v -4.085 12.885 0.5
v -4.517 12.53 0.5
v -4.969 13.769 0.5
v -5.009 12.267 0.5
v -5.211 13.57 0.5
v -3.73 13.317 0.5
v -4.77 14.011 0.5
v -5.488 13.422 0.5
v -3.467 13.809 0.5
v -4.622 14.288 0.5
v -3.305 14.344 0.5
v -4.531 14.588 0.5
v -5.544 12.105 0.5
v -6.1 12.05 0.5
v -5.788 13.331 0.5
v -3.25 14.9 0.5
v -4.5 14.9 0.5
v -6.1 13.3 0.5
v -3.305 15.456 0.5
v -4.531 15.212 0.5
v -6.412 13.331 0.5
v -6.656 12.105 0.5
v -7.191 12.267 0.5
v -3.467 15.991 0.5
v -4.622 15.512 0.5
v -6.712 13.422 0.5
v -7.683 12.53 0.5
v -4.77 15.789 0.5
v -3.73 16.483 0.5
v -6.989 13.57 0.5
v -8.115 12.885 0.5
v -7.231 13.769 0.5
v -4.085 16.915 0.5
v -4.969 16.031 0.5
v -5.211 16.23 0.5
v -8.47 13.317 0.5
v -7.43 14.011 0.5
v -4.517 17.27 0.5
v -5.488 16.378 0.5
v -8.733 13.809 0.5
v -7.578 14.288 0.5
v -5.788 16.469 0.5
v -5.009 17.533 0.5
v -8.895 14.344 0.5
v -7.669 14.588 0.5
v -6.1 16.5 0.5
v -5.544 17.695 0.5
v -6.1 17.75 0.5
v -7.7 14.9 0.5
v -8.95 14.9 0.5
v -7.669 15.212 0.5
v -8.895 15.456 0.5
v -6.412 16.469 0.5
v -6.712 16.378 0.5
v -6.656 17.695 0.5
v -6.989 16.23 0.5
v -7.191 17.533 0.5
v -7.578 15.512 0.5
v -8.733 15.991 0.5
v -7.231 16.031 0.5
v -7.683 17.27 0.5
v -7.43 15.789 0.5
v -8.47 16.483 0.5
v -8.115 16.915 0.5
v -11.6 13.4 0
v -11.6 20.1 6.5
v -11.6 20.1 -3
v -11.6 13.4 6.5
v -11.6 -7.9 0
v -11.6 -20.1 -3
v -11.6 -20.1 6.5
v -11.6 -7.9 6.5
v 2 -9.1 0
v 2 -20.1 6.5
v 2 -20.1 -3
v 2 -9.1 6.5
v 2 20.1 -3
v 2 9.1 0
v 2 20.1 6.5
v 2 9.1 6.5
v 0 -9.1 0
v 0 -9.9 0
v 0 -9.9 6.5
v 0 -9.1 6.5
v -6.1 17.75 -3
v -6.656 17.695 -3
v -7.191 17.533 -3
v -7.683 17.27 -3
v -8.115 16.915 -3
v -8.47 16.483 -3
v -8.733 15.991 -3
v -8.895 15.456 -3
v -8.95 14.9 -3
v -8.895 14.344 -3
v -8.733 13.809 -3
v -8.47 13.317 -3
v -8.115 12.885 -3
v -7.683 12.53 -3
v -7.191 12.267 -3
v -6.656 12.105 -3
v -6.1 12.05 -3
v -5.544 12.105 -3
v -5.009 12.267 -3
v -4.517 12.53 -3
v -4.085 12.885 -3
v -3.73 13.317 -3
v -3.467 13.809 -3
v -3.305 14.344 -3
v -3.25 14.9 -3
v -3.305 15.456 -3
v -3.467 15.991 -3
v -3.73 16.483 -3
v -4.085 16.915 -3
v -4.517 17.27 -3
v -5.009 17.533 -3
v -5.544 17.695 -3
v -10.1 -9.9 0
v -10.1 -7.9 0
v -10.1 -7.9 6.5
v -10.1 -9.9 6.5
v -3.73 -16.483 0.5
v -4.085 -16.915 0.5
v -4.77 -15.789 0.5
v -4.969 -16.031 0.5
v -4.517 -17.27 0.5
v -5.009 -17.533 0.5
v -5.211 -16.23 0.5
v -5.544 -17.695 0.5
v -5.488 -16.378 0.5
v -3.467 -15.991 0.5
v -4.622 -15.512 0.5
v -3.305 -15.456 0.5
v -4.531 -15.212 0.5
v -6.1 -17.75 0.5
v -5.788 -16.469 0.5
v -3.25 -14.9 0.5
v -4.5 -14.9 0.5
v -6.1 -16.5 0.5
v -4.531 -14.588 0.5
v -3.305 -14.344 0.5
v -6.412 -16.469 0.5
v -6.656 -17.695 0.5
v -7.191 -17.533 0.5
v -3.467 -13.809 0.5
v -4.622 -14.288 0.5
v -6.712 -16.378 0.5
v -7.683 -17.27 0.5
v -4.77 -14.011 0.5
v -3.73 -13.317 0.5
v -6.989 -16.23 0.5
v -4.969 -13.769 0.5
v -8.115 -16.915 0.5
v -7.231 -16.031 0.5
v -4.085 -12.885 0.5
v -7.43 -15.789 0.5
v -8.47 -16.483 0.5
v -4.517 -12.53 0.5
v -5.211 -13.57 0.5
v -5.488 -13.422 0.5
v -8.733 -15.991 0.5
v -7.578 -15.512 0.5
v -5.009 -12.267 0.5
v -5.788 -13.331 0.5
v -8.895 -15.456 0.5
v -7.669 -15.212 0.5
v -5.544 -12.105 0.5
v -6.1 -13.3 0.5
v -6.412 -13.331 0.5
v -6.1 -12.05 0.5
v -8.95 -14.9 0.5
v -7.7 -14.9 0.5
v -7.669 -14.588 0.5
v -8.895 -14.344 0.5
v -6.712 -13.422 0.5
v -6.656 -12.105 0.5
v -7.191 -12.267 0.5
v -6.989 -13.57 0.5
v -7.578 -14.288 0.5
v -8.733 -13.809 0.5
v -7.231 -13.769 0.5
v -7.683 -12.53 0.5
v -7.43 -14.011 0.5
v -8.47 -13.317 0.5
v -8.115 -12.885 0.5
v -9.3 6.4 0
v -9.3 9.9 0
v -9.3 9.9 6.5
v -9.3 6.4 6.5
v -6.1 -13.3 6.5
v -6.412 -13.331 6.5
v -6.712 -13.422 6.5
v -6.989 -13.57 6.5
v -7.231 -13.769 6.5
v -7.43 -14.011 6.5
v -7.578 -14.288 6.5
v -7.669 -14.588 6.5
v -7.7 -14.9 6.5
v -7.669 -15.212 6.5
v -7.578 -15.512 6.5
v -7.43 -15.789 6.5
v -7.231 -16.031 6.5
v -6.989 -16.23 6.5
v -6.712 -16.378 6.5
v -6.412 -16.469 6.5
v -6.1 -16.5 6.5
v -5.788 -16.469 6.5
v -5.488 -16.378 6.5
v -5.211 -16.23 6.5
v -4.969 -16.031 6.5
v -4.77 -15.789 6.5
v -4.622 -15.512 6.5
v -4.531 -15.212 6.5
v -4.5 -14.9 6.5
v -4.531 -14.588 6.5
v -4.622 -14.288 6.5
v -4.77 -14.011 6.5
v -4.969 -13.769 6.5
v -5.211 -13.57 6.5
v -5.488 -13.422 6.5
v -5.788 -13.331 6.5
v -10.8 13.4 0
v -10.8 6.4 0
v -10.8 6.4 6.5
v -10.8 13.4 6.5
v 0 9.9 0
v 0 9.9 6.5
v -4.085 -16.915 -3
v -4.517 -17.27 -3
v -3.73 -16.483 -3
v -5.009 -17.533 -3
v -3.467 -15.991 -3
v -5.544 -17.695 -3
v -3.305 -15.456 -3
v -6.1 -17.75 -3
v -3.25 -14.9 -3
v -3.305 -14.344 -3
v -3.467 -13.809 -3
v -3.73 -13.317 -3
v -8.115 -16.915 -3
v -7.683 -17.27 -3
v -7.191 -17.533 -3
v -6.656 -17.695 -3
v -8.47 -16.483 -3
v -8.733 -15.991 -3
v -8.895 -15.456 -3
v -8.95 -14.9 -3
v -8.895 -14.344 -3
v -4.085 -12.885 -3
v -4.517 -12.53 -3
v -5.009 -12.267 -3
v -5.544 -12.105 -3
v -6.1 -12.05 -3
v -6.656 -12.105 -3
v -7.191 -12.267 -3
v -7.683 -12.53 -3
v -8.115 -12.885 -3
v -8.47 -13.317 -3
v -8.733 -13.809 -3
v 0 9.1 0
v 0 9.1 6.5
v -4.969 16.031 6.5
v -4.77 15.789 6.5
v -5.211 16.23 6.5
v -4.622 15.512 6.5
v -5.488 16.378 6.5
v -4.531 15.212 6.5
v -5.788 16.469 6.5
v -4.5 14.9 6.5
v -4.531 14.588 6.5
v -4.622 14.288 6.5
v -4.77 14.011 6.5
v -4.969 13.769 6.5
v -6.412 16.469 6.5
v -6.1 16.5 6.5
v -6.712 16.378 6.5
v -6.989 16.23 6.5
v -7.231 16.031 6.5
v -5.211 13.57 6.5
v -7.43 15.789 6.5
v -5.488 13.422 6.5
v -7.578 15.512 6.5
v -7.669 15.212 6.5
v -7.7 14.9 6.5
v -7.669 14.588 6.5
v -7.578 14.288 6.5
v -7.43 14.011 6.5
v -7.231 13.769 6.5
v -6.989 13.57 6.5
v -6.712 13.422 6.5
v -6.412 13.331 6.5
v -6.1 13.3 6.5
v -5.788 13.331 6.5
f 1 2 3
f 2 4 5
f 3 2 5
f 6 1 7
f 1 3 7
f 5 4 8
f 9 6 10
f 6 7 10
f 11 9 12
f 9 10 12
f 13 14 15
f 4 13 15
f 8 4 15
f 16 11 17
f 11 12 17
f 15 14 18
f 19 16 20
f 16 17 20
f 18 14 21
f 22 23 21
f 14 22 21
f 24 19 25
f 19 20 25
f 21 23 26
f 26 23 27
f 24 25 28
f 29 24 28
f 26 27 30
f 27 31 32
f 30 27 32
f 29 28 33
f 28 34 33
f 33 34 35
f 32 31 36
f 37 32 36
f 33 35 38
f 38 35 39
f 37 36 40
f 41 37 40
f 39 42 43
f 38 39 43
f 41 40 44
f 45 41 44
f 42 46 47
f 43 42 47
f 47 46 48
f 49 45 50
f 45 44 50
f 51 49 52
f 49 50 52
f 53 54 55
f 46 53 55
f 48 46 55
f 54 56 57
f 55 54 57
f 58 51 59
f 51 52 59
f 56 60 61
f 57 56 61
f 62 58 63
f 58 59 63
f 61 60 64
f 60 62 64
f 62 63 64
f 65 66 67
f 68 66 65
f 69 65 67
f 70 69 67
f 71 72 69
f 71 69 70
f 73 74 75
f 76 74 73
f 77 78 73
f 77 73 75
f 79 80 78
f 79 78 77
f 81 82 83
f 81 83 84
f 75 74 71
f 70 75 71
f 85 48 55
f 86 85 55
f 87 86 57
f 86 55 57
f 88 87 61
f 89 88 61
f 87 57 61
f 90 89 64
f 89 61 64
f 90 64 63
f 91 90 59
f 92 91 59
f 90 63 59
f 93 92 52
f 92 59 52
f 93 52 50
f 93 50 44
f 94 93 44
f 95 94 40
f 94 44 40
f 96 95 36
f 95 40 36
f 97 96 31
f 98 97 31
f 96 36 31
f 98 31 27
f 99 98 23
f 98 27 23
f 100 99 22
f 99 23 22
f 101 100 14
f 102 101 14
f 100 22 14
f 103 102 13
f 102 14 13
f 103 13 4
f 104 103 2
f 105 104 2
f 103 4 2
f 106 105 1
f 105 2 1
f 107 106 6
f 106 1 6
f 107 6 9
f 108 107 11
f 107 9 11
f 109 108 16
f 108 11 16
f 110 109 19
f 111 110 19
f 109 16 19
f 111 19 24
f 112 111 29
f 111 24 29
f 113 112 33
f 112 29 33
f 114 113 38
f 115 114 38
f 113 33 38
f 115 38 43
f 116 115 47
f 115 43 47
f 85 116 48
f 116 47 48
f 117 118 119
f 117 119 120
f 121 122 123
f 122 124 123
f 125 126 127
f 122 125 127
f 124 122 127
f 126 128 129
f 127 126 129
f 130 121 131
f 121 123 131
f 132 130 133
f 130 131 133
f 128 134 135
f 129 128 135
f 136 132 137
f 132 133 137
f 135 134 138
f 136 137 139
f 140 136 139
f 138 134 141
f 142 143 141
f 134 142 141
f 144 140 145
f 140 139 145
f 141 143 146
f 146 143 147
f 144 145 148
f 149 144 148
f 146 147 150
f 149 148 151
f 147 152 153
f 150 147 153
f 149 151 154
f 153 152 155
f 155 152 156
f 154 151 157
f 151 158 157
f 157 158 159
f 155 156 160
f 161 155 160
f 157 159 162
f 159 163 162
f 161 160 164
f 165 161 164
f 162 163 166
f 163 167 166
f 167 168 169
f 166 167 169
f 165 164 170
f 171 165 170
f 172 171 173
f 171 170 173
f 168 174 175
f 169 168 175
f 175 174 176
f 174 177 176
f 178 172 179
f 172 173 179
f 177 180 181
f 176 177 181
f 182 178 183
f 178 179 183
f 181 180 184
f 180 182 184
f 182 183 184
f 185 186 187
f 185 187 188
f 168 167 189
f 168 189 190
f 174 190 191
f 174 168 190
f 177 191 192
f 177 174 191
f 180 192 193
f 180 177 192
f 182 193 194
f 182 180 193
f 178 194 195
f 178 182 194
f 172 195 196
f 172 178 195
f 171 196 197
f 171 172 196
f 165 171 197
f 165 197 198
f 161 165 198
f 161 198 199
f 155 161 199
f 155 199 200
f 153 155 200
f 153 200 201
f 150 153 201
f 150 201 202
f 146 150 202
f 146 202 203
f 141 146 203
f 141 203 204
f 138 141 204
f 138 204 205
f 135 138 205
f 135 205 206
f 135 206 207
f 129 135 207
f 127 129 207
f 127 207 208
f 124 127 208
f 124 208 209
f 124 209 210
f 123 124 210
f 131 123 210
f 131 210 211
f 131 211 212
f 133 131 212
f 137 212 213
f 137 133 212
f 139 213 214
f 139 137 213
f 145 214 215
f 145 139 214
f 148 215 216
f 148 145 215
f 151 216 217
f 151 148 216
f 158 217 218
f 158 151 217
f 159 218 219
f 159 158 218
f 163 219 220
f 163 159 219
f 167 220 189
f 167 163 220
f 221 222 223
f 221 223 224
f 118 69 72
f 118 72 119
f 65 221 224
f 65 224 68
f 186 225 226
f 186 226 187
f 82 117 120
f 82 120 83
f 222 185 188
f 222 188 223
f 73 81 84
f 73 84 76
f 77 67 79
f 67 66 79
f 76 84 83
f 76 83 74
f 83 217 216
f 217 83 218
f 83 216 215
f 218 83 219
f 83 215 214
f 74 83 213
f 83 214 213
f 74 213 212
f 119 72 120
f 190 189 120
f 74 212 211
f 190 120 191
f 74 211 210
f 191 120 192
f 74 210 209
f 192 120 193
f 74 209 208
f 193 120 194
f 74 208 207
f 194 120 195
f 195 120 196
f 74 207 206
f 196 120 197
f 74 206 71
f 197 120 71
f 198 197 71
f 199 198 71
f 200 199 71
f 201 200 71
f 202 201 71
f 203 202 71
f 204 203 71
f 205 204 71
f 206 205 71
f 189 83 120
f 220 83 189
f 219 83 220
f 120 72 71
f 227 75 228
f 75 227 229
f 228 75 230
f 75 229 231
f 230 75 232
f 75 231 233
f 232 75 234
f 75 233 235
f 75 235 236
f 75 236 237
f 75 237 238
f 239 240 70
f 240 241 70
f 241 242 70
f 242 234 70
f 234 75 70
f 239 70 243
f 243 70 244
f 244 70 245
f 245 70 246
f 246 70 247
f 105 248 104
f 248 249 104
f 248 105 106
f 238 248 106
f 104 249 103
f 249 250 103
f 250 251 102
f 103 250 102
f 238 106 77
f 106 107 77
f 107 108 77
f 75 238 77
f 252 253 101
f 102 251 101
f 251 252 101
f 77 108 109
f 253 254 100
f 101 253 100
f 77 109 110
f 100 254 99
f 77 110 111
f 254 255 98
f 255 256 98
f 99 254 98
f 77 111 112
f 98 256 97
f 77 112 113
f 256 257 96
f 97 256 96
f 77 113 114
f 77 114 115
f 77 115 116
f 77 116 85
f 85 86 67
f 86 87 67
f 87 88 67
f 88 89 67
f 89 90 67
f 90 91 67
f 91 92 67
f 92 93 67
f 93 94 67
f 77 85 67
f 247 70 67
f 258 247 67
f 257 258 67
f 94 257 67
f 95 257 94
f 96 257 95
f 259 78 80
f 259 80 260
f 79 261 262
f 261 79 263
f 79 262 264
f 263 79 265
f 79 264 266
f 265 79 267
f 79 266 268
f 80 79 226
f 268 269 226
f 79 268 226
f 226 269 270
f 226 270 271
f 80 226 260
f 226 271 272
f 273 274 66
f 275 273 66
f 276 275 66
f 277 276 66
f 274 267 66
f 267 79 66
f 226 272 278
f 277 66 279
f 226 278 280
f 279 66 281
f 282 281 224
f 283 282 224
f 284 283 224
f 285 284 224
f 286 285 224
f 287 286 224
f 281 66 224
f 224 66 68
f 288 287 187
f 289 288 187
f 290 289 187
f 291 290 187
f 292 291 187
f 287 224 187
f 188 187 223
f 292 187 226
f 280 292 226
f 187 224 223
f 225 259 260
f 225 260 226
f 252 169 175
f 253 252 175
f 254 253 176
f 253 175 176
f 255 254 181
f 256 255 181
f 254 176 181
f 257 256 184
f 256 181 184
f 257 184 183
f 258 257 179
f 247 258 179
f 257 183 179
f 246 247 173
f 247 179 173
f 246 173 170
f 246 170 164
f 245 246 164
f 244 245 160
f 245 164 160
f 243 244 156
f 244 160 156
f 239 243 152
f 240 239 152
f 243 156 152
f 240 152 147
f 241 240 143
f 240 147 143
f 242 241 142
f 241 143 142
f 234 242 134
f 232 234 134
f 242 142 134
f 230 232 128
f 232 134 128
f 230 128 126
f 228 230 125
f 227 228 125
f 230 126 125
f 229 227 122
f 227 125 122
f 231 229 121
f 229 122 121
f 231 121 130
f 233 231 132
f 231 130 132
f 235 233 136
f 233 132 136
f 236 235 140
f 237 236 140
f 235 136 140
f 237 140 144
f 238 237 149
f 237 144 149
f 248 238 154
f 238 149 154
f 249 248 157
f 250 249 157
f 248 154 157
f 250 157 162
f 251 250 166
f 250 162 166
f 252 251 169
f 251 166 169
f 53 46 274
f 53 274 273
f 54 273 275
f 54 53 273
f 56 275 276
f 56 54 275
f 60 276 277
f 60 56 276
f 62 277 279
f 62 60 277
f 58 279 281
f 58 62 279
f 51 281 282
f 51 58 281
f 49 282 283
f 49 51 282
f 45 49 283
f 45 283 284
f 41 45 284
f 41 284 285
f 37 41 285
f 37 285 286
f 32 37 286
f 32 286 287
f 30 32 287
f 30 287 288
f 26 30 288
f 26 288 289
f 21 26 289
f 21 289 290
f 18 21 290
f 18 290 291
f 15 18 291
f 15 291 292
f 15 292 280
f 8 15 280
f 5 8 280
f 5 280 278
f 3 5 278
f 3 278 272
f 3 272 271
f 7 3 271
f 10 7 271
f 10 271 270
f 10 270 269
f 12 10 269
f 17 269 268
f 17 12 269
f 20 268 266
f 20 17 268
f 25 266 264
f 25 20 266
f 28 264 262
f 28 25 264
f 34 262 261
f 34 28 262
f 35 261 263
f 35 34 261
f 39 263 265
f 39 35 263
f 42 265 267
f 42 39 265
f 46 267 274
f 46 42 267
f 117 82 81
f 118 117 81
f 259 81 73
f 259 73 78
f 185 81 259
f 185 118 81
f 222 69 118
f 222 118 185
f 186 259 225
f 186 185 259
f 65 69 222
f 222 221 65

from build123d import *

# Parameters (mm, degrees)
SKETCH1_R               = 2.85
SKETCH1_R_2             = 1.6
BOSS_EXTRUDE1_DEPTH     = 6.5
SKETCH1_3_R             = 2.85
SKETCH1_3_R_2           = 1.6
BOSS_EXTRUDE2_DEPTH     = 3
CUT_EXTRUDE1_START      = -3
SKETCH1_4_R             = 2.85
CUT_EXTRUDE1_DEPTH      = 3.5
CUT_EXTRUDE1_DEPTH_BACK = 4


with BuildPart() as part:
    # Sketch1 → Boss-Extrude1 (new body)
    with BuildSketch(Plane(origin=(0, 0, 0), x_dir=(0, 1, 0), z_dir=(0, 0, 1))):
        Polygon((-7.9, 10.1), (-9.9, 10.1), (-9.9, 0), (-9.1, 0), (-9.1, -2), (-20.1, -2), (-20.1, 11.6), (-7.9, 11.6), align=None)
        with Locations((-14.9, 6.1)):
            Circle(SKETCH1_R, mode=Mode.SUBTRACT)
        Polygon((13.4, 11.6), (20.1, 11.6), (20.1, -2), (9.1, -2), (9.1, 0), (9.9, 0), (9.9, 9.3), (6.4, 9.3), (6.4, 10.8), (13.4, 10.8), align=None)
        with Locations((14.9, 6.1)):
            Circle(SKETCH1_R, mode=Mode.SUBTRACT)
        with Locations((-14.9, 6.1)):
            Circle(SKETCH1_R)
        with Locations((-14.9, 6.1)):
            Circle(SKETCH1_R_2, mode=Mode.SUBTRACT)
        with Locations((14.9, 6.1)):
            Circle(SKETCH1_R)
        with Locations((14.9, 6.1)):
            Circle(SKETCH1_R_2, mode=Mode.SUBTRACT)
    extrude(amount=BOSS_EXTRUDE1_DEPTH)

    # Sketch1<3> → Boss-Extrude2 (add)
    with BuildSketch(Plane(origin=(0, 0, 0), x_dir=(0, 1, 0), z_dir=(0, 0, 1))):
        with Locations((14.9, 6.1)):
            Circle(SKETCH1_3_R)
        with Locations((14.9, 6.1)):
            Circle(SKETCH1_3_R_2, mode=Mode.SUBTRACT)
        Polygon((13.4, 11.6), (20.1, 11.6), (20.1, -2), (9.1, -2), (9.1, 0), (9.9, 0), (9.9, 9.3), (6.4, 9.3), (6.4, 10.8), (13.4, 10.8), align=None)
        with Locations((14.9, 6.1)):
            Circle(SKETCH1_3_R, mode=Mode.SUBTRACT)
        Polygon((-7.9, 11.6), (13.4, 11.6), (13.4, 10.8), (6.4, 10.8), (6.4, 9.3), (9.9, 9.3), (9.9, 0), (9.1, 0), (9.1, -2), (-9.1, -2), (-9.1, 0), (-9.9, 0), (-9.9, 10.1), (-7.9, 10.1), align=None)
        with Locations((-14.9, 6.1)):
            Circle(SKETCH1_3_R)
        with Locations((-14.9, 6.1)):
            Circle(SKETCH1_3_R_2, mode=Mode.SUBTRACT)
        Polygon((-7.9, 10.1), (-9.9, 10.1), (-9.9, 0), (-9.1, 0), (-9.1, -2), (-20.1, -2), (-20.1, 11.6), (-7.9, 11.6), align=None)
        with Locations((-14.9, 6.1)):
            Circle(SKETCH1_3_R, mode=Mode.SUBTRACT)
    extrude(amount=-BOSS_EXTRUDE2_DEPTH)

    # Sketch1<4> → Cut-Extrude1 (cut, two sides)
    with BuildSketch(Plane(origin=(0, 0, 0), x_dir=(0, 1, 0), z_dir=(0, 0, 1)).offset(CUT_EXTRUDE1_START)) as cut_extrude1_sk:
        with Locations((14.9, 6.1)):
            Circle(SKETCH1_4_R)
        with Locations((-14.9, 6.1)):
            Circle(SKETCH1_4_R)
    extrude(amount=CUT_EXTRUDE1_DEPTH, mode=Mode.SUBTRACT)
    extrude(cut_extrude1_sk.sketch, amount=-CUT_EXTRUDE1_DEPTH_BACK, mode=Mode.SUBTRACT)


solid = part.part
